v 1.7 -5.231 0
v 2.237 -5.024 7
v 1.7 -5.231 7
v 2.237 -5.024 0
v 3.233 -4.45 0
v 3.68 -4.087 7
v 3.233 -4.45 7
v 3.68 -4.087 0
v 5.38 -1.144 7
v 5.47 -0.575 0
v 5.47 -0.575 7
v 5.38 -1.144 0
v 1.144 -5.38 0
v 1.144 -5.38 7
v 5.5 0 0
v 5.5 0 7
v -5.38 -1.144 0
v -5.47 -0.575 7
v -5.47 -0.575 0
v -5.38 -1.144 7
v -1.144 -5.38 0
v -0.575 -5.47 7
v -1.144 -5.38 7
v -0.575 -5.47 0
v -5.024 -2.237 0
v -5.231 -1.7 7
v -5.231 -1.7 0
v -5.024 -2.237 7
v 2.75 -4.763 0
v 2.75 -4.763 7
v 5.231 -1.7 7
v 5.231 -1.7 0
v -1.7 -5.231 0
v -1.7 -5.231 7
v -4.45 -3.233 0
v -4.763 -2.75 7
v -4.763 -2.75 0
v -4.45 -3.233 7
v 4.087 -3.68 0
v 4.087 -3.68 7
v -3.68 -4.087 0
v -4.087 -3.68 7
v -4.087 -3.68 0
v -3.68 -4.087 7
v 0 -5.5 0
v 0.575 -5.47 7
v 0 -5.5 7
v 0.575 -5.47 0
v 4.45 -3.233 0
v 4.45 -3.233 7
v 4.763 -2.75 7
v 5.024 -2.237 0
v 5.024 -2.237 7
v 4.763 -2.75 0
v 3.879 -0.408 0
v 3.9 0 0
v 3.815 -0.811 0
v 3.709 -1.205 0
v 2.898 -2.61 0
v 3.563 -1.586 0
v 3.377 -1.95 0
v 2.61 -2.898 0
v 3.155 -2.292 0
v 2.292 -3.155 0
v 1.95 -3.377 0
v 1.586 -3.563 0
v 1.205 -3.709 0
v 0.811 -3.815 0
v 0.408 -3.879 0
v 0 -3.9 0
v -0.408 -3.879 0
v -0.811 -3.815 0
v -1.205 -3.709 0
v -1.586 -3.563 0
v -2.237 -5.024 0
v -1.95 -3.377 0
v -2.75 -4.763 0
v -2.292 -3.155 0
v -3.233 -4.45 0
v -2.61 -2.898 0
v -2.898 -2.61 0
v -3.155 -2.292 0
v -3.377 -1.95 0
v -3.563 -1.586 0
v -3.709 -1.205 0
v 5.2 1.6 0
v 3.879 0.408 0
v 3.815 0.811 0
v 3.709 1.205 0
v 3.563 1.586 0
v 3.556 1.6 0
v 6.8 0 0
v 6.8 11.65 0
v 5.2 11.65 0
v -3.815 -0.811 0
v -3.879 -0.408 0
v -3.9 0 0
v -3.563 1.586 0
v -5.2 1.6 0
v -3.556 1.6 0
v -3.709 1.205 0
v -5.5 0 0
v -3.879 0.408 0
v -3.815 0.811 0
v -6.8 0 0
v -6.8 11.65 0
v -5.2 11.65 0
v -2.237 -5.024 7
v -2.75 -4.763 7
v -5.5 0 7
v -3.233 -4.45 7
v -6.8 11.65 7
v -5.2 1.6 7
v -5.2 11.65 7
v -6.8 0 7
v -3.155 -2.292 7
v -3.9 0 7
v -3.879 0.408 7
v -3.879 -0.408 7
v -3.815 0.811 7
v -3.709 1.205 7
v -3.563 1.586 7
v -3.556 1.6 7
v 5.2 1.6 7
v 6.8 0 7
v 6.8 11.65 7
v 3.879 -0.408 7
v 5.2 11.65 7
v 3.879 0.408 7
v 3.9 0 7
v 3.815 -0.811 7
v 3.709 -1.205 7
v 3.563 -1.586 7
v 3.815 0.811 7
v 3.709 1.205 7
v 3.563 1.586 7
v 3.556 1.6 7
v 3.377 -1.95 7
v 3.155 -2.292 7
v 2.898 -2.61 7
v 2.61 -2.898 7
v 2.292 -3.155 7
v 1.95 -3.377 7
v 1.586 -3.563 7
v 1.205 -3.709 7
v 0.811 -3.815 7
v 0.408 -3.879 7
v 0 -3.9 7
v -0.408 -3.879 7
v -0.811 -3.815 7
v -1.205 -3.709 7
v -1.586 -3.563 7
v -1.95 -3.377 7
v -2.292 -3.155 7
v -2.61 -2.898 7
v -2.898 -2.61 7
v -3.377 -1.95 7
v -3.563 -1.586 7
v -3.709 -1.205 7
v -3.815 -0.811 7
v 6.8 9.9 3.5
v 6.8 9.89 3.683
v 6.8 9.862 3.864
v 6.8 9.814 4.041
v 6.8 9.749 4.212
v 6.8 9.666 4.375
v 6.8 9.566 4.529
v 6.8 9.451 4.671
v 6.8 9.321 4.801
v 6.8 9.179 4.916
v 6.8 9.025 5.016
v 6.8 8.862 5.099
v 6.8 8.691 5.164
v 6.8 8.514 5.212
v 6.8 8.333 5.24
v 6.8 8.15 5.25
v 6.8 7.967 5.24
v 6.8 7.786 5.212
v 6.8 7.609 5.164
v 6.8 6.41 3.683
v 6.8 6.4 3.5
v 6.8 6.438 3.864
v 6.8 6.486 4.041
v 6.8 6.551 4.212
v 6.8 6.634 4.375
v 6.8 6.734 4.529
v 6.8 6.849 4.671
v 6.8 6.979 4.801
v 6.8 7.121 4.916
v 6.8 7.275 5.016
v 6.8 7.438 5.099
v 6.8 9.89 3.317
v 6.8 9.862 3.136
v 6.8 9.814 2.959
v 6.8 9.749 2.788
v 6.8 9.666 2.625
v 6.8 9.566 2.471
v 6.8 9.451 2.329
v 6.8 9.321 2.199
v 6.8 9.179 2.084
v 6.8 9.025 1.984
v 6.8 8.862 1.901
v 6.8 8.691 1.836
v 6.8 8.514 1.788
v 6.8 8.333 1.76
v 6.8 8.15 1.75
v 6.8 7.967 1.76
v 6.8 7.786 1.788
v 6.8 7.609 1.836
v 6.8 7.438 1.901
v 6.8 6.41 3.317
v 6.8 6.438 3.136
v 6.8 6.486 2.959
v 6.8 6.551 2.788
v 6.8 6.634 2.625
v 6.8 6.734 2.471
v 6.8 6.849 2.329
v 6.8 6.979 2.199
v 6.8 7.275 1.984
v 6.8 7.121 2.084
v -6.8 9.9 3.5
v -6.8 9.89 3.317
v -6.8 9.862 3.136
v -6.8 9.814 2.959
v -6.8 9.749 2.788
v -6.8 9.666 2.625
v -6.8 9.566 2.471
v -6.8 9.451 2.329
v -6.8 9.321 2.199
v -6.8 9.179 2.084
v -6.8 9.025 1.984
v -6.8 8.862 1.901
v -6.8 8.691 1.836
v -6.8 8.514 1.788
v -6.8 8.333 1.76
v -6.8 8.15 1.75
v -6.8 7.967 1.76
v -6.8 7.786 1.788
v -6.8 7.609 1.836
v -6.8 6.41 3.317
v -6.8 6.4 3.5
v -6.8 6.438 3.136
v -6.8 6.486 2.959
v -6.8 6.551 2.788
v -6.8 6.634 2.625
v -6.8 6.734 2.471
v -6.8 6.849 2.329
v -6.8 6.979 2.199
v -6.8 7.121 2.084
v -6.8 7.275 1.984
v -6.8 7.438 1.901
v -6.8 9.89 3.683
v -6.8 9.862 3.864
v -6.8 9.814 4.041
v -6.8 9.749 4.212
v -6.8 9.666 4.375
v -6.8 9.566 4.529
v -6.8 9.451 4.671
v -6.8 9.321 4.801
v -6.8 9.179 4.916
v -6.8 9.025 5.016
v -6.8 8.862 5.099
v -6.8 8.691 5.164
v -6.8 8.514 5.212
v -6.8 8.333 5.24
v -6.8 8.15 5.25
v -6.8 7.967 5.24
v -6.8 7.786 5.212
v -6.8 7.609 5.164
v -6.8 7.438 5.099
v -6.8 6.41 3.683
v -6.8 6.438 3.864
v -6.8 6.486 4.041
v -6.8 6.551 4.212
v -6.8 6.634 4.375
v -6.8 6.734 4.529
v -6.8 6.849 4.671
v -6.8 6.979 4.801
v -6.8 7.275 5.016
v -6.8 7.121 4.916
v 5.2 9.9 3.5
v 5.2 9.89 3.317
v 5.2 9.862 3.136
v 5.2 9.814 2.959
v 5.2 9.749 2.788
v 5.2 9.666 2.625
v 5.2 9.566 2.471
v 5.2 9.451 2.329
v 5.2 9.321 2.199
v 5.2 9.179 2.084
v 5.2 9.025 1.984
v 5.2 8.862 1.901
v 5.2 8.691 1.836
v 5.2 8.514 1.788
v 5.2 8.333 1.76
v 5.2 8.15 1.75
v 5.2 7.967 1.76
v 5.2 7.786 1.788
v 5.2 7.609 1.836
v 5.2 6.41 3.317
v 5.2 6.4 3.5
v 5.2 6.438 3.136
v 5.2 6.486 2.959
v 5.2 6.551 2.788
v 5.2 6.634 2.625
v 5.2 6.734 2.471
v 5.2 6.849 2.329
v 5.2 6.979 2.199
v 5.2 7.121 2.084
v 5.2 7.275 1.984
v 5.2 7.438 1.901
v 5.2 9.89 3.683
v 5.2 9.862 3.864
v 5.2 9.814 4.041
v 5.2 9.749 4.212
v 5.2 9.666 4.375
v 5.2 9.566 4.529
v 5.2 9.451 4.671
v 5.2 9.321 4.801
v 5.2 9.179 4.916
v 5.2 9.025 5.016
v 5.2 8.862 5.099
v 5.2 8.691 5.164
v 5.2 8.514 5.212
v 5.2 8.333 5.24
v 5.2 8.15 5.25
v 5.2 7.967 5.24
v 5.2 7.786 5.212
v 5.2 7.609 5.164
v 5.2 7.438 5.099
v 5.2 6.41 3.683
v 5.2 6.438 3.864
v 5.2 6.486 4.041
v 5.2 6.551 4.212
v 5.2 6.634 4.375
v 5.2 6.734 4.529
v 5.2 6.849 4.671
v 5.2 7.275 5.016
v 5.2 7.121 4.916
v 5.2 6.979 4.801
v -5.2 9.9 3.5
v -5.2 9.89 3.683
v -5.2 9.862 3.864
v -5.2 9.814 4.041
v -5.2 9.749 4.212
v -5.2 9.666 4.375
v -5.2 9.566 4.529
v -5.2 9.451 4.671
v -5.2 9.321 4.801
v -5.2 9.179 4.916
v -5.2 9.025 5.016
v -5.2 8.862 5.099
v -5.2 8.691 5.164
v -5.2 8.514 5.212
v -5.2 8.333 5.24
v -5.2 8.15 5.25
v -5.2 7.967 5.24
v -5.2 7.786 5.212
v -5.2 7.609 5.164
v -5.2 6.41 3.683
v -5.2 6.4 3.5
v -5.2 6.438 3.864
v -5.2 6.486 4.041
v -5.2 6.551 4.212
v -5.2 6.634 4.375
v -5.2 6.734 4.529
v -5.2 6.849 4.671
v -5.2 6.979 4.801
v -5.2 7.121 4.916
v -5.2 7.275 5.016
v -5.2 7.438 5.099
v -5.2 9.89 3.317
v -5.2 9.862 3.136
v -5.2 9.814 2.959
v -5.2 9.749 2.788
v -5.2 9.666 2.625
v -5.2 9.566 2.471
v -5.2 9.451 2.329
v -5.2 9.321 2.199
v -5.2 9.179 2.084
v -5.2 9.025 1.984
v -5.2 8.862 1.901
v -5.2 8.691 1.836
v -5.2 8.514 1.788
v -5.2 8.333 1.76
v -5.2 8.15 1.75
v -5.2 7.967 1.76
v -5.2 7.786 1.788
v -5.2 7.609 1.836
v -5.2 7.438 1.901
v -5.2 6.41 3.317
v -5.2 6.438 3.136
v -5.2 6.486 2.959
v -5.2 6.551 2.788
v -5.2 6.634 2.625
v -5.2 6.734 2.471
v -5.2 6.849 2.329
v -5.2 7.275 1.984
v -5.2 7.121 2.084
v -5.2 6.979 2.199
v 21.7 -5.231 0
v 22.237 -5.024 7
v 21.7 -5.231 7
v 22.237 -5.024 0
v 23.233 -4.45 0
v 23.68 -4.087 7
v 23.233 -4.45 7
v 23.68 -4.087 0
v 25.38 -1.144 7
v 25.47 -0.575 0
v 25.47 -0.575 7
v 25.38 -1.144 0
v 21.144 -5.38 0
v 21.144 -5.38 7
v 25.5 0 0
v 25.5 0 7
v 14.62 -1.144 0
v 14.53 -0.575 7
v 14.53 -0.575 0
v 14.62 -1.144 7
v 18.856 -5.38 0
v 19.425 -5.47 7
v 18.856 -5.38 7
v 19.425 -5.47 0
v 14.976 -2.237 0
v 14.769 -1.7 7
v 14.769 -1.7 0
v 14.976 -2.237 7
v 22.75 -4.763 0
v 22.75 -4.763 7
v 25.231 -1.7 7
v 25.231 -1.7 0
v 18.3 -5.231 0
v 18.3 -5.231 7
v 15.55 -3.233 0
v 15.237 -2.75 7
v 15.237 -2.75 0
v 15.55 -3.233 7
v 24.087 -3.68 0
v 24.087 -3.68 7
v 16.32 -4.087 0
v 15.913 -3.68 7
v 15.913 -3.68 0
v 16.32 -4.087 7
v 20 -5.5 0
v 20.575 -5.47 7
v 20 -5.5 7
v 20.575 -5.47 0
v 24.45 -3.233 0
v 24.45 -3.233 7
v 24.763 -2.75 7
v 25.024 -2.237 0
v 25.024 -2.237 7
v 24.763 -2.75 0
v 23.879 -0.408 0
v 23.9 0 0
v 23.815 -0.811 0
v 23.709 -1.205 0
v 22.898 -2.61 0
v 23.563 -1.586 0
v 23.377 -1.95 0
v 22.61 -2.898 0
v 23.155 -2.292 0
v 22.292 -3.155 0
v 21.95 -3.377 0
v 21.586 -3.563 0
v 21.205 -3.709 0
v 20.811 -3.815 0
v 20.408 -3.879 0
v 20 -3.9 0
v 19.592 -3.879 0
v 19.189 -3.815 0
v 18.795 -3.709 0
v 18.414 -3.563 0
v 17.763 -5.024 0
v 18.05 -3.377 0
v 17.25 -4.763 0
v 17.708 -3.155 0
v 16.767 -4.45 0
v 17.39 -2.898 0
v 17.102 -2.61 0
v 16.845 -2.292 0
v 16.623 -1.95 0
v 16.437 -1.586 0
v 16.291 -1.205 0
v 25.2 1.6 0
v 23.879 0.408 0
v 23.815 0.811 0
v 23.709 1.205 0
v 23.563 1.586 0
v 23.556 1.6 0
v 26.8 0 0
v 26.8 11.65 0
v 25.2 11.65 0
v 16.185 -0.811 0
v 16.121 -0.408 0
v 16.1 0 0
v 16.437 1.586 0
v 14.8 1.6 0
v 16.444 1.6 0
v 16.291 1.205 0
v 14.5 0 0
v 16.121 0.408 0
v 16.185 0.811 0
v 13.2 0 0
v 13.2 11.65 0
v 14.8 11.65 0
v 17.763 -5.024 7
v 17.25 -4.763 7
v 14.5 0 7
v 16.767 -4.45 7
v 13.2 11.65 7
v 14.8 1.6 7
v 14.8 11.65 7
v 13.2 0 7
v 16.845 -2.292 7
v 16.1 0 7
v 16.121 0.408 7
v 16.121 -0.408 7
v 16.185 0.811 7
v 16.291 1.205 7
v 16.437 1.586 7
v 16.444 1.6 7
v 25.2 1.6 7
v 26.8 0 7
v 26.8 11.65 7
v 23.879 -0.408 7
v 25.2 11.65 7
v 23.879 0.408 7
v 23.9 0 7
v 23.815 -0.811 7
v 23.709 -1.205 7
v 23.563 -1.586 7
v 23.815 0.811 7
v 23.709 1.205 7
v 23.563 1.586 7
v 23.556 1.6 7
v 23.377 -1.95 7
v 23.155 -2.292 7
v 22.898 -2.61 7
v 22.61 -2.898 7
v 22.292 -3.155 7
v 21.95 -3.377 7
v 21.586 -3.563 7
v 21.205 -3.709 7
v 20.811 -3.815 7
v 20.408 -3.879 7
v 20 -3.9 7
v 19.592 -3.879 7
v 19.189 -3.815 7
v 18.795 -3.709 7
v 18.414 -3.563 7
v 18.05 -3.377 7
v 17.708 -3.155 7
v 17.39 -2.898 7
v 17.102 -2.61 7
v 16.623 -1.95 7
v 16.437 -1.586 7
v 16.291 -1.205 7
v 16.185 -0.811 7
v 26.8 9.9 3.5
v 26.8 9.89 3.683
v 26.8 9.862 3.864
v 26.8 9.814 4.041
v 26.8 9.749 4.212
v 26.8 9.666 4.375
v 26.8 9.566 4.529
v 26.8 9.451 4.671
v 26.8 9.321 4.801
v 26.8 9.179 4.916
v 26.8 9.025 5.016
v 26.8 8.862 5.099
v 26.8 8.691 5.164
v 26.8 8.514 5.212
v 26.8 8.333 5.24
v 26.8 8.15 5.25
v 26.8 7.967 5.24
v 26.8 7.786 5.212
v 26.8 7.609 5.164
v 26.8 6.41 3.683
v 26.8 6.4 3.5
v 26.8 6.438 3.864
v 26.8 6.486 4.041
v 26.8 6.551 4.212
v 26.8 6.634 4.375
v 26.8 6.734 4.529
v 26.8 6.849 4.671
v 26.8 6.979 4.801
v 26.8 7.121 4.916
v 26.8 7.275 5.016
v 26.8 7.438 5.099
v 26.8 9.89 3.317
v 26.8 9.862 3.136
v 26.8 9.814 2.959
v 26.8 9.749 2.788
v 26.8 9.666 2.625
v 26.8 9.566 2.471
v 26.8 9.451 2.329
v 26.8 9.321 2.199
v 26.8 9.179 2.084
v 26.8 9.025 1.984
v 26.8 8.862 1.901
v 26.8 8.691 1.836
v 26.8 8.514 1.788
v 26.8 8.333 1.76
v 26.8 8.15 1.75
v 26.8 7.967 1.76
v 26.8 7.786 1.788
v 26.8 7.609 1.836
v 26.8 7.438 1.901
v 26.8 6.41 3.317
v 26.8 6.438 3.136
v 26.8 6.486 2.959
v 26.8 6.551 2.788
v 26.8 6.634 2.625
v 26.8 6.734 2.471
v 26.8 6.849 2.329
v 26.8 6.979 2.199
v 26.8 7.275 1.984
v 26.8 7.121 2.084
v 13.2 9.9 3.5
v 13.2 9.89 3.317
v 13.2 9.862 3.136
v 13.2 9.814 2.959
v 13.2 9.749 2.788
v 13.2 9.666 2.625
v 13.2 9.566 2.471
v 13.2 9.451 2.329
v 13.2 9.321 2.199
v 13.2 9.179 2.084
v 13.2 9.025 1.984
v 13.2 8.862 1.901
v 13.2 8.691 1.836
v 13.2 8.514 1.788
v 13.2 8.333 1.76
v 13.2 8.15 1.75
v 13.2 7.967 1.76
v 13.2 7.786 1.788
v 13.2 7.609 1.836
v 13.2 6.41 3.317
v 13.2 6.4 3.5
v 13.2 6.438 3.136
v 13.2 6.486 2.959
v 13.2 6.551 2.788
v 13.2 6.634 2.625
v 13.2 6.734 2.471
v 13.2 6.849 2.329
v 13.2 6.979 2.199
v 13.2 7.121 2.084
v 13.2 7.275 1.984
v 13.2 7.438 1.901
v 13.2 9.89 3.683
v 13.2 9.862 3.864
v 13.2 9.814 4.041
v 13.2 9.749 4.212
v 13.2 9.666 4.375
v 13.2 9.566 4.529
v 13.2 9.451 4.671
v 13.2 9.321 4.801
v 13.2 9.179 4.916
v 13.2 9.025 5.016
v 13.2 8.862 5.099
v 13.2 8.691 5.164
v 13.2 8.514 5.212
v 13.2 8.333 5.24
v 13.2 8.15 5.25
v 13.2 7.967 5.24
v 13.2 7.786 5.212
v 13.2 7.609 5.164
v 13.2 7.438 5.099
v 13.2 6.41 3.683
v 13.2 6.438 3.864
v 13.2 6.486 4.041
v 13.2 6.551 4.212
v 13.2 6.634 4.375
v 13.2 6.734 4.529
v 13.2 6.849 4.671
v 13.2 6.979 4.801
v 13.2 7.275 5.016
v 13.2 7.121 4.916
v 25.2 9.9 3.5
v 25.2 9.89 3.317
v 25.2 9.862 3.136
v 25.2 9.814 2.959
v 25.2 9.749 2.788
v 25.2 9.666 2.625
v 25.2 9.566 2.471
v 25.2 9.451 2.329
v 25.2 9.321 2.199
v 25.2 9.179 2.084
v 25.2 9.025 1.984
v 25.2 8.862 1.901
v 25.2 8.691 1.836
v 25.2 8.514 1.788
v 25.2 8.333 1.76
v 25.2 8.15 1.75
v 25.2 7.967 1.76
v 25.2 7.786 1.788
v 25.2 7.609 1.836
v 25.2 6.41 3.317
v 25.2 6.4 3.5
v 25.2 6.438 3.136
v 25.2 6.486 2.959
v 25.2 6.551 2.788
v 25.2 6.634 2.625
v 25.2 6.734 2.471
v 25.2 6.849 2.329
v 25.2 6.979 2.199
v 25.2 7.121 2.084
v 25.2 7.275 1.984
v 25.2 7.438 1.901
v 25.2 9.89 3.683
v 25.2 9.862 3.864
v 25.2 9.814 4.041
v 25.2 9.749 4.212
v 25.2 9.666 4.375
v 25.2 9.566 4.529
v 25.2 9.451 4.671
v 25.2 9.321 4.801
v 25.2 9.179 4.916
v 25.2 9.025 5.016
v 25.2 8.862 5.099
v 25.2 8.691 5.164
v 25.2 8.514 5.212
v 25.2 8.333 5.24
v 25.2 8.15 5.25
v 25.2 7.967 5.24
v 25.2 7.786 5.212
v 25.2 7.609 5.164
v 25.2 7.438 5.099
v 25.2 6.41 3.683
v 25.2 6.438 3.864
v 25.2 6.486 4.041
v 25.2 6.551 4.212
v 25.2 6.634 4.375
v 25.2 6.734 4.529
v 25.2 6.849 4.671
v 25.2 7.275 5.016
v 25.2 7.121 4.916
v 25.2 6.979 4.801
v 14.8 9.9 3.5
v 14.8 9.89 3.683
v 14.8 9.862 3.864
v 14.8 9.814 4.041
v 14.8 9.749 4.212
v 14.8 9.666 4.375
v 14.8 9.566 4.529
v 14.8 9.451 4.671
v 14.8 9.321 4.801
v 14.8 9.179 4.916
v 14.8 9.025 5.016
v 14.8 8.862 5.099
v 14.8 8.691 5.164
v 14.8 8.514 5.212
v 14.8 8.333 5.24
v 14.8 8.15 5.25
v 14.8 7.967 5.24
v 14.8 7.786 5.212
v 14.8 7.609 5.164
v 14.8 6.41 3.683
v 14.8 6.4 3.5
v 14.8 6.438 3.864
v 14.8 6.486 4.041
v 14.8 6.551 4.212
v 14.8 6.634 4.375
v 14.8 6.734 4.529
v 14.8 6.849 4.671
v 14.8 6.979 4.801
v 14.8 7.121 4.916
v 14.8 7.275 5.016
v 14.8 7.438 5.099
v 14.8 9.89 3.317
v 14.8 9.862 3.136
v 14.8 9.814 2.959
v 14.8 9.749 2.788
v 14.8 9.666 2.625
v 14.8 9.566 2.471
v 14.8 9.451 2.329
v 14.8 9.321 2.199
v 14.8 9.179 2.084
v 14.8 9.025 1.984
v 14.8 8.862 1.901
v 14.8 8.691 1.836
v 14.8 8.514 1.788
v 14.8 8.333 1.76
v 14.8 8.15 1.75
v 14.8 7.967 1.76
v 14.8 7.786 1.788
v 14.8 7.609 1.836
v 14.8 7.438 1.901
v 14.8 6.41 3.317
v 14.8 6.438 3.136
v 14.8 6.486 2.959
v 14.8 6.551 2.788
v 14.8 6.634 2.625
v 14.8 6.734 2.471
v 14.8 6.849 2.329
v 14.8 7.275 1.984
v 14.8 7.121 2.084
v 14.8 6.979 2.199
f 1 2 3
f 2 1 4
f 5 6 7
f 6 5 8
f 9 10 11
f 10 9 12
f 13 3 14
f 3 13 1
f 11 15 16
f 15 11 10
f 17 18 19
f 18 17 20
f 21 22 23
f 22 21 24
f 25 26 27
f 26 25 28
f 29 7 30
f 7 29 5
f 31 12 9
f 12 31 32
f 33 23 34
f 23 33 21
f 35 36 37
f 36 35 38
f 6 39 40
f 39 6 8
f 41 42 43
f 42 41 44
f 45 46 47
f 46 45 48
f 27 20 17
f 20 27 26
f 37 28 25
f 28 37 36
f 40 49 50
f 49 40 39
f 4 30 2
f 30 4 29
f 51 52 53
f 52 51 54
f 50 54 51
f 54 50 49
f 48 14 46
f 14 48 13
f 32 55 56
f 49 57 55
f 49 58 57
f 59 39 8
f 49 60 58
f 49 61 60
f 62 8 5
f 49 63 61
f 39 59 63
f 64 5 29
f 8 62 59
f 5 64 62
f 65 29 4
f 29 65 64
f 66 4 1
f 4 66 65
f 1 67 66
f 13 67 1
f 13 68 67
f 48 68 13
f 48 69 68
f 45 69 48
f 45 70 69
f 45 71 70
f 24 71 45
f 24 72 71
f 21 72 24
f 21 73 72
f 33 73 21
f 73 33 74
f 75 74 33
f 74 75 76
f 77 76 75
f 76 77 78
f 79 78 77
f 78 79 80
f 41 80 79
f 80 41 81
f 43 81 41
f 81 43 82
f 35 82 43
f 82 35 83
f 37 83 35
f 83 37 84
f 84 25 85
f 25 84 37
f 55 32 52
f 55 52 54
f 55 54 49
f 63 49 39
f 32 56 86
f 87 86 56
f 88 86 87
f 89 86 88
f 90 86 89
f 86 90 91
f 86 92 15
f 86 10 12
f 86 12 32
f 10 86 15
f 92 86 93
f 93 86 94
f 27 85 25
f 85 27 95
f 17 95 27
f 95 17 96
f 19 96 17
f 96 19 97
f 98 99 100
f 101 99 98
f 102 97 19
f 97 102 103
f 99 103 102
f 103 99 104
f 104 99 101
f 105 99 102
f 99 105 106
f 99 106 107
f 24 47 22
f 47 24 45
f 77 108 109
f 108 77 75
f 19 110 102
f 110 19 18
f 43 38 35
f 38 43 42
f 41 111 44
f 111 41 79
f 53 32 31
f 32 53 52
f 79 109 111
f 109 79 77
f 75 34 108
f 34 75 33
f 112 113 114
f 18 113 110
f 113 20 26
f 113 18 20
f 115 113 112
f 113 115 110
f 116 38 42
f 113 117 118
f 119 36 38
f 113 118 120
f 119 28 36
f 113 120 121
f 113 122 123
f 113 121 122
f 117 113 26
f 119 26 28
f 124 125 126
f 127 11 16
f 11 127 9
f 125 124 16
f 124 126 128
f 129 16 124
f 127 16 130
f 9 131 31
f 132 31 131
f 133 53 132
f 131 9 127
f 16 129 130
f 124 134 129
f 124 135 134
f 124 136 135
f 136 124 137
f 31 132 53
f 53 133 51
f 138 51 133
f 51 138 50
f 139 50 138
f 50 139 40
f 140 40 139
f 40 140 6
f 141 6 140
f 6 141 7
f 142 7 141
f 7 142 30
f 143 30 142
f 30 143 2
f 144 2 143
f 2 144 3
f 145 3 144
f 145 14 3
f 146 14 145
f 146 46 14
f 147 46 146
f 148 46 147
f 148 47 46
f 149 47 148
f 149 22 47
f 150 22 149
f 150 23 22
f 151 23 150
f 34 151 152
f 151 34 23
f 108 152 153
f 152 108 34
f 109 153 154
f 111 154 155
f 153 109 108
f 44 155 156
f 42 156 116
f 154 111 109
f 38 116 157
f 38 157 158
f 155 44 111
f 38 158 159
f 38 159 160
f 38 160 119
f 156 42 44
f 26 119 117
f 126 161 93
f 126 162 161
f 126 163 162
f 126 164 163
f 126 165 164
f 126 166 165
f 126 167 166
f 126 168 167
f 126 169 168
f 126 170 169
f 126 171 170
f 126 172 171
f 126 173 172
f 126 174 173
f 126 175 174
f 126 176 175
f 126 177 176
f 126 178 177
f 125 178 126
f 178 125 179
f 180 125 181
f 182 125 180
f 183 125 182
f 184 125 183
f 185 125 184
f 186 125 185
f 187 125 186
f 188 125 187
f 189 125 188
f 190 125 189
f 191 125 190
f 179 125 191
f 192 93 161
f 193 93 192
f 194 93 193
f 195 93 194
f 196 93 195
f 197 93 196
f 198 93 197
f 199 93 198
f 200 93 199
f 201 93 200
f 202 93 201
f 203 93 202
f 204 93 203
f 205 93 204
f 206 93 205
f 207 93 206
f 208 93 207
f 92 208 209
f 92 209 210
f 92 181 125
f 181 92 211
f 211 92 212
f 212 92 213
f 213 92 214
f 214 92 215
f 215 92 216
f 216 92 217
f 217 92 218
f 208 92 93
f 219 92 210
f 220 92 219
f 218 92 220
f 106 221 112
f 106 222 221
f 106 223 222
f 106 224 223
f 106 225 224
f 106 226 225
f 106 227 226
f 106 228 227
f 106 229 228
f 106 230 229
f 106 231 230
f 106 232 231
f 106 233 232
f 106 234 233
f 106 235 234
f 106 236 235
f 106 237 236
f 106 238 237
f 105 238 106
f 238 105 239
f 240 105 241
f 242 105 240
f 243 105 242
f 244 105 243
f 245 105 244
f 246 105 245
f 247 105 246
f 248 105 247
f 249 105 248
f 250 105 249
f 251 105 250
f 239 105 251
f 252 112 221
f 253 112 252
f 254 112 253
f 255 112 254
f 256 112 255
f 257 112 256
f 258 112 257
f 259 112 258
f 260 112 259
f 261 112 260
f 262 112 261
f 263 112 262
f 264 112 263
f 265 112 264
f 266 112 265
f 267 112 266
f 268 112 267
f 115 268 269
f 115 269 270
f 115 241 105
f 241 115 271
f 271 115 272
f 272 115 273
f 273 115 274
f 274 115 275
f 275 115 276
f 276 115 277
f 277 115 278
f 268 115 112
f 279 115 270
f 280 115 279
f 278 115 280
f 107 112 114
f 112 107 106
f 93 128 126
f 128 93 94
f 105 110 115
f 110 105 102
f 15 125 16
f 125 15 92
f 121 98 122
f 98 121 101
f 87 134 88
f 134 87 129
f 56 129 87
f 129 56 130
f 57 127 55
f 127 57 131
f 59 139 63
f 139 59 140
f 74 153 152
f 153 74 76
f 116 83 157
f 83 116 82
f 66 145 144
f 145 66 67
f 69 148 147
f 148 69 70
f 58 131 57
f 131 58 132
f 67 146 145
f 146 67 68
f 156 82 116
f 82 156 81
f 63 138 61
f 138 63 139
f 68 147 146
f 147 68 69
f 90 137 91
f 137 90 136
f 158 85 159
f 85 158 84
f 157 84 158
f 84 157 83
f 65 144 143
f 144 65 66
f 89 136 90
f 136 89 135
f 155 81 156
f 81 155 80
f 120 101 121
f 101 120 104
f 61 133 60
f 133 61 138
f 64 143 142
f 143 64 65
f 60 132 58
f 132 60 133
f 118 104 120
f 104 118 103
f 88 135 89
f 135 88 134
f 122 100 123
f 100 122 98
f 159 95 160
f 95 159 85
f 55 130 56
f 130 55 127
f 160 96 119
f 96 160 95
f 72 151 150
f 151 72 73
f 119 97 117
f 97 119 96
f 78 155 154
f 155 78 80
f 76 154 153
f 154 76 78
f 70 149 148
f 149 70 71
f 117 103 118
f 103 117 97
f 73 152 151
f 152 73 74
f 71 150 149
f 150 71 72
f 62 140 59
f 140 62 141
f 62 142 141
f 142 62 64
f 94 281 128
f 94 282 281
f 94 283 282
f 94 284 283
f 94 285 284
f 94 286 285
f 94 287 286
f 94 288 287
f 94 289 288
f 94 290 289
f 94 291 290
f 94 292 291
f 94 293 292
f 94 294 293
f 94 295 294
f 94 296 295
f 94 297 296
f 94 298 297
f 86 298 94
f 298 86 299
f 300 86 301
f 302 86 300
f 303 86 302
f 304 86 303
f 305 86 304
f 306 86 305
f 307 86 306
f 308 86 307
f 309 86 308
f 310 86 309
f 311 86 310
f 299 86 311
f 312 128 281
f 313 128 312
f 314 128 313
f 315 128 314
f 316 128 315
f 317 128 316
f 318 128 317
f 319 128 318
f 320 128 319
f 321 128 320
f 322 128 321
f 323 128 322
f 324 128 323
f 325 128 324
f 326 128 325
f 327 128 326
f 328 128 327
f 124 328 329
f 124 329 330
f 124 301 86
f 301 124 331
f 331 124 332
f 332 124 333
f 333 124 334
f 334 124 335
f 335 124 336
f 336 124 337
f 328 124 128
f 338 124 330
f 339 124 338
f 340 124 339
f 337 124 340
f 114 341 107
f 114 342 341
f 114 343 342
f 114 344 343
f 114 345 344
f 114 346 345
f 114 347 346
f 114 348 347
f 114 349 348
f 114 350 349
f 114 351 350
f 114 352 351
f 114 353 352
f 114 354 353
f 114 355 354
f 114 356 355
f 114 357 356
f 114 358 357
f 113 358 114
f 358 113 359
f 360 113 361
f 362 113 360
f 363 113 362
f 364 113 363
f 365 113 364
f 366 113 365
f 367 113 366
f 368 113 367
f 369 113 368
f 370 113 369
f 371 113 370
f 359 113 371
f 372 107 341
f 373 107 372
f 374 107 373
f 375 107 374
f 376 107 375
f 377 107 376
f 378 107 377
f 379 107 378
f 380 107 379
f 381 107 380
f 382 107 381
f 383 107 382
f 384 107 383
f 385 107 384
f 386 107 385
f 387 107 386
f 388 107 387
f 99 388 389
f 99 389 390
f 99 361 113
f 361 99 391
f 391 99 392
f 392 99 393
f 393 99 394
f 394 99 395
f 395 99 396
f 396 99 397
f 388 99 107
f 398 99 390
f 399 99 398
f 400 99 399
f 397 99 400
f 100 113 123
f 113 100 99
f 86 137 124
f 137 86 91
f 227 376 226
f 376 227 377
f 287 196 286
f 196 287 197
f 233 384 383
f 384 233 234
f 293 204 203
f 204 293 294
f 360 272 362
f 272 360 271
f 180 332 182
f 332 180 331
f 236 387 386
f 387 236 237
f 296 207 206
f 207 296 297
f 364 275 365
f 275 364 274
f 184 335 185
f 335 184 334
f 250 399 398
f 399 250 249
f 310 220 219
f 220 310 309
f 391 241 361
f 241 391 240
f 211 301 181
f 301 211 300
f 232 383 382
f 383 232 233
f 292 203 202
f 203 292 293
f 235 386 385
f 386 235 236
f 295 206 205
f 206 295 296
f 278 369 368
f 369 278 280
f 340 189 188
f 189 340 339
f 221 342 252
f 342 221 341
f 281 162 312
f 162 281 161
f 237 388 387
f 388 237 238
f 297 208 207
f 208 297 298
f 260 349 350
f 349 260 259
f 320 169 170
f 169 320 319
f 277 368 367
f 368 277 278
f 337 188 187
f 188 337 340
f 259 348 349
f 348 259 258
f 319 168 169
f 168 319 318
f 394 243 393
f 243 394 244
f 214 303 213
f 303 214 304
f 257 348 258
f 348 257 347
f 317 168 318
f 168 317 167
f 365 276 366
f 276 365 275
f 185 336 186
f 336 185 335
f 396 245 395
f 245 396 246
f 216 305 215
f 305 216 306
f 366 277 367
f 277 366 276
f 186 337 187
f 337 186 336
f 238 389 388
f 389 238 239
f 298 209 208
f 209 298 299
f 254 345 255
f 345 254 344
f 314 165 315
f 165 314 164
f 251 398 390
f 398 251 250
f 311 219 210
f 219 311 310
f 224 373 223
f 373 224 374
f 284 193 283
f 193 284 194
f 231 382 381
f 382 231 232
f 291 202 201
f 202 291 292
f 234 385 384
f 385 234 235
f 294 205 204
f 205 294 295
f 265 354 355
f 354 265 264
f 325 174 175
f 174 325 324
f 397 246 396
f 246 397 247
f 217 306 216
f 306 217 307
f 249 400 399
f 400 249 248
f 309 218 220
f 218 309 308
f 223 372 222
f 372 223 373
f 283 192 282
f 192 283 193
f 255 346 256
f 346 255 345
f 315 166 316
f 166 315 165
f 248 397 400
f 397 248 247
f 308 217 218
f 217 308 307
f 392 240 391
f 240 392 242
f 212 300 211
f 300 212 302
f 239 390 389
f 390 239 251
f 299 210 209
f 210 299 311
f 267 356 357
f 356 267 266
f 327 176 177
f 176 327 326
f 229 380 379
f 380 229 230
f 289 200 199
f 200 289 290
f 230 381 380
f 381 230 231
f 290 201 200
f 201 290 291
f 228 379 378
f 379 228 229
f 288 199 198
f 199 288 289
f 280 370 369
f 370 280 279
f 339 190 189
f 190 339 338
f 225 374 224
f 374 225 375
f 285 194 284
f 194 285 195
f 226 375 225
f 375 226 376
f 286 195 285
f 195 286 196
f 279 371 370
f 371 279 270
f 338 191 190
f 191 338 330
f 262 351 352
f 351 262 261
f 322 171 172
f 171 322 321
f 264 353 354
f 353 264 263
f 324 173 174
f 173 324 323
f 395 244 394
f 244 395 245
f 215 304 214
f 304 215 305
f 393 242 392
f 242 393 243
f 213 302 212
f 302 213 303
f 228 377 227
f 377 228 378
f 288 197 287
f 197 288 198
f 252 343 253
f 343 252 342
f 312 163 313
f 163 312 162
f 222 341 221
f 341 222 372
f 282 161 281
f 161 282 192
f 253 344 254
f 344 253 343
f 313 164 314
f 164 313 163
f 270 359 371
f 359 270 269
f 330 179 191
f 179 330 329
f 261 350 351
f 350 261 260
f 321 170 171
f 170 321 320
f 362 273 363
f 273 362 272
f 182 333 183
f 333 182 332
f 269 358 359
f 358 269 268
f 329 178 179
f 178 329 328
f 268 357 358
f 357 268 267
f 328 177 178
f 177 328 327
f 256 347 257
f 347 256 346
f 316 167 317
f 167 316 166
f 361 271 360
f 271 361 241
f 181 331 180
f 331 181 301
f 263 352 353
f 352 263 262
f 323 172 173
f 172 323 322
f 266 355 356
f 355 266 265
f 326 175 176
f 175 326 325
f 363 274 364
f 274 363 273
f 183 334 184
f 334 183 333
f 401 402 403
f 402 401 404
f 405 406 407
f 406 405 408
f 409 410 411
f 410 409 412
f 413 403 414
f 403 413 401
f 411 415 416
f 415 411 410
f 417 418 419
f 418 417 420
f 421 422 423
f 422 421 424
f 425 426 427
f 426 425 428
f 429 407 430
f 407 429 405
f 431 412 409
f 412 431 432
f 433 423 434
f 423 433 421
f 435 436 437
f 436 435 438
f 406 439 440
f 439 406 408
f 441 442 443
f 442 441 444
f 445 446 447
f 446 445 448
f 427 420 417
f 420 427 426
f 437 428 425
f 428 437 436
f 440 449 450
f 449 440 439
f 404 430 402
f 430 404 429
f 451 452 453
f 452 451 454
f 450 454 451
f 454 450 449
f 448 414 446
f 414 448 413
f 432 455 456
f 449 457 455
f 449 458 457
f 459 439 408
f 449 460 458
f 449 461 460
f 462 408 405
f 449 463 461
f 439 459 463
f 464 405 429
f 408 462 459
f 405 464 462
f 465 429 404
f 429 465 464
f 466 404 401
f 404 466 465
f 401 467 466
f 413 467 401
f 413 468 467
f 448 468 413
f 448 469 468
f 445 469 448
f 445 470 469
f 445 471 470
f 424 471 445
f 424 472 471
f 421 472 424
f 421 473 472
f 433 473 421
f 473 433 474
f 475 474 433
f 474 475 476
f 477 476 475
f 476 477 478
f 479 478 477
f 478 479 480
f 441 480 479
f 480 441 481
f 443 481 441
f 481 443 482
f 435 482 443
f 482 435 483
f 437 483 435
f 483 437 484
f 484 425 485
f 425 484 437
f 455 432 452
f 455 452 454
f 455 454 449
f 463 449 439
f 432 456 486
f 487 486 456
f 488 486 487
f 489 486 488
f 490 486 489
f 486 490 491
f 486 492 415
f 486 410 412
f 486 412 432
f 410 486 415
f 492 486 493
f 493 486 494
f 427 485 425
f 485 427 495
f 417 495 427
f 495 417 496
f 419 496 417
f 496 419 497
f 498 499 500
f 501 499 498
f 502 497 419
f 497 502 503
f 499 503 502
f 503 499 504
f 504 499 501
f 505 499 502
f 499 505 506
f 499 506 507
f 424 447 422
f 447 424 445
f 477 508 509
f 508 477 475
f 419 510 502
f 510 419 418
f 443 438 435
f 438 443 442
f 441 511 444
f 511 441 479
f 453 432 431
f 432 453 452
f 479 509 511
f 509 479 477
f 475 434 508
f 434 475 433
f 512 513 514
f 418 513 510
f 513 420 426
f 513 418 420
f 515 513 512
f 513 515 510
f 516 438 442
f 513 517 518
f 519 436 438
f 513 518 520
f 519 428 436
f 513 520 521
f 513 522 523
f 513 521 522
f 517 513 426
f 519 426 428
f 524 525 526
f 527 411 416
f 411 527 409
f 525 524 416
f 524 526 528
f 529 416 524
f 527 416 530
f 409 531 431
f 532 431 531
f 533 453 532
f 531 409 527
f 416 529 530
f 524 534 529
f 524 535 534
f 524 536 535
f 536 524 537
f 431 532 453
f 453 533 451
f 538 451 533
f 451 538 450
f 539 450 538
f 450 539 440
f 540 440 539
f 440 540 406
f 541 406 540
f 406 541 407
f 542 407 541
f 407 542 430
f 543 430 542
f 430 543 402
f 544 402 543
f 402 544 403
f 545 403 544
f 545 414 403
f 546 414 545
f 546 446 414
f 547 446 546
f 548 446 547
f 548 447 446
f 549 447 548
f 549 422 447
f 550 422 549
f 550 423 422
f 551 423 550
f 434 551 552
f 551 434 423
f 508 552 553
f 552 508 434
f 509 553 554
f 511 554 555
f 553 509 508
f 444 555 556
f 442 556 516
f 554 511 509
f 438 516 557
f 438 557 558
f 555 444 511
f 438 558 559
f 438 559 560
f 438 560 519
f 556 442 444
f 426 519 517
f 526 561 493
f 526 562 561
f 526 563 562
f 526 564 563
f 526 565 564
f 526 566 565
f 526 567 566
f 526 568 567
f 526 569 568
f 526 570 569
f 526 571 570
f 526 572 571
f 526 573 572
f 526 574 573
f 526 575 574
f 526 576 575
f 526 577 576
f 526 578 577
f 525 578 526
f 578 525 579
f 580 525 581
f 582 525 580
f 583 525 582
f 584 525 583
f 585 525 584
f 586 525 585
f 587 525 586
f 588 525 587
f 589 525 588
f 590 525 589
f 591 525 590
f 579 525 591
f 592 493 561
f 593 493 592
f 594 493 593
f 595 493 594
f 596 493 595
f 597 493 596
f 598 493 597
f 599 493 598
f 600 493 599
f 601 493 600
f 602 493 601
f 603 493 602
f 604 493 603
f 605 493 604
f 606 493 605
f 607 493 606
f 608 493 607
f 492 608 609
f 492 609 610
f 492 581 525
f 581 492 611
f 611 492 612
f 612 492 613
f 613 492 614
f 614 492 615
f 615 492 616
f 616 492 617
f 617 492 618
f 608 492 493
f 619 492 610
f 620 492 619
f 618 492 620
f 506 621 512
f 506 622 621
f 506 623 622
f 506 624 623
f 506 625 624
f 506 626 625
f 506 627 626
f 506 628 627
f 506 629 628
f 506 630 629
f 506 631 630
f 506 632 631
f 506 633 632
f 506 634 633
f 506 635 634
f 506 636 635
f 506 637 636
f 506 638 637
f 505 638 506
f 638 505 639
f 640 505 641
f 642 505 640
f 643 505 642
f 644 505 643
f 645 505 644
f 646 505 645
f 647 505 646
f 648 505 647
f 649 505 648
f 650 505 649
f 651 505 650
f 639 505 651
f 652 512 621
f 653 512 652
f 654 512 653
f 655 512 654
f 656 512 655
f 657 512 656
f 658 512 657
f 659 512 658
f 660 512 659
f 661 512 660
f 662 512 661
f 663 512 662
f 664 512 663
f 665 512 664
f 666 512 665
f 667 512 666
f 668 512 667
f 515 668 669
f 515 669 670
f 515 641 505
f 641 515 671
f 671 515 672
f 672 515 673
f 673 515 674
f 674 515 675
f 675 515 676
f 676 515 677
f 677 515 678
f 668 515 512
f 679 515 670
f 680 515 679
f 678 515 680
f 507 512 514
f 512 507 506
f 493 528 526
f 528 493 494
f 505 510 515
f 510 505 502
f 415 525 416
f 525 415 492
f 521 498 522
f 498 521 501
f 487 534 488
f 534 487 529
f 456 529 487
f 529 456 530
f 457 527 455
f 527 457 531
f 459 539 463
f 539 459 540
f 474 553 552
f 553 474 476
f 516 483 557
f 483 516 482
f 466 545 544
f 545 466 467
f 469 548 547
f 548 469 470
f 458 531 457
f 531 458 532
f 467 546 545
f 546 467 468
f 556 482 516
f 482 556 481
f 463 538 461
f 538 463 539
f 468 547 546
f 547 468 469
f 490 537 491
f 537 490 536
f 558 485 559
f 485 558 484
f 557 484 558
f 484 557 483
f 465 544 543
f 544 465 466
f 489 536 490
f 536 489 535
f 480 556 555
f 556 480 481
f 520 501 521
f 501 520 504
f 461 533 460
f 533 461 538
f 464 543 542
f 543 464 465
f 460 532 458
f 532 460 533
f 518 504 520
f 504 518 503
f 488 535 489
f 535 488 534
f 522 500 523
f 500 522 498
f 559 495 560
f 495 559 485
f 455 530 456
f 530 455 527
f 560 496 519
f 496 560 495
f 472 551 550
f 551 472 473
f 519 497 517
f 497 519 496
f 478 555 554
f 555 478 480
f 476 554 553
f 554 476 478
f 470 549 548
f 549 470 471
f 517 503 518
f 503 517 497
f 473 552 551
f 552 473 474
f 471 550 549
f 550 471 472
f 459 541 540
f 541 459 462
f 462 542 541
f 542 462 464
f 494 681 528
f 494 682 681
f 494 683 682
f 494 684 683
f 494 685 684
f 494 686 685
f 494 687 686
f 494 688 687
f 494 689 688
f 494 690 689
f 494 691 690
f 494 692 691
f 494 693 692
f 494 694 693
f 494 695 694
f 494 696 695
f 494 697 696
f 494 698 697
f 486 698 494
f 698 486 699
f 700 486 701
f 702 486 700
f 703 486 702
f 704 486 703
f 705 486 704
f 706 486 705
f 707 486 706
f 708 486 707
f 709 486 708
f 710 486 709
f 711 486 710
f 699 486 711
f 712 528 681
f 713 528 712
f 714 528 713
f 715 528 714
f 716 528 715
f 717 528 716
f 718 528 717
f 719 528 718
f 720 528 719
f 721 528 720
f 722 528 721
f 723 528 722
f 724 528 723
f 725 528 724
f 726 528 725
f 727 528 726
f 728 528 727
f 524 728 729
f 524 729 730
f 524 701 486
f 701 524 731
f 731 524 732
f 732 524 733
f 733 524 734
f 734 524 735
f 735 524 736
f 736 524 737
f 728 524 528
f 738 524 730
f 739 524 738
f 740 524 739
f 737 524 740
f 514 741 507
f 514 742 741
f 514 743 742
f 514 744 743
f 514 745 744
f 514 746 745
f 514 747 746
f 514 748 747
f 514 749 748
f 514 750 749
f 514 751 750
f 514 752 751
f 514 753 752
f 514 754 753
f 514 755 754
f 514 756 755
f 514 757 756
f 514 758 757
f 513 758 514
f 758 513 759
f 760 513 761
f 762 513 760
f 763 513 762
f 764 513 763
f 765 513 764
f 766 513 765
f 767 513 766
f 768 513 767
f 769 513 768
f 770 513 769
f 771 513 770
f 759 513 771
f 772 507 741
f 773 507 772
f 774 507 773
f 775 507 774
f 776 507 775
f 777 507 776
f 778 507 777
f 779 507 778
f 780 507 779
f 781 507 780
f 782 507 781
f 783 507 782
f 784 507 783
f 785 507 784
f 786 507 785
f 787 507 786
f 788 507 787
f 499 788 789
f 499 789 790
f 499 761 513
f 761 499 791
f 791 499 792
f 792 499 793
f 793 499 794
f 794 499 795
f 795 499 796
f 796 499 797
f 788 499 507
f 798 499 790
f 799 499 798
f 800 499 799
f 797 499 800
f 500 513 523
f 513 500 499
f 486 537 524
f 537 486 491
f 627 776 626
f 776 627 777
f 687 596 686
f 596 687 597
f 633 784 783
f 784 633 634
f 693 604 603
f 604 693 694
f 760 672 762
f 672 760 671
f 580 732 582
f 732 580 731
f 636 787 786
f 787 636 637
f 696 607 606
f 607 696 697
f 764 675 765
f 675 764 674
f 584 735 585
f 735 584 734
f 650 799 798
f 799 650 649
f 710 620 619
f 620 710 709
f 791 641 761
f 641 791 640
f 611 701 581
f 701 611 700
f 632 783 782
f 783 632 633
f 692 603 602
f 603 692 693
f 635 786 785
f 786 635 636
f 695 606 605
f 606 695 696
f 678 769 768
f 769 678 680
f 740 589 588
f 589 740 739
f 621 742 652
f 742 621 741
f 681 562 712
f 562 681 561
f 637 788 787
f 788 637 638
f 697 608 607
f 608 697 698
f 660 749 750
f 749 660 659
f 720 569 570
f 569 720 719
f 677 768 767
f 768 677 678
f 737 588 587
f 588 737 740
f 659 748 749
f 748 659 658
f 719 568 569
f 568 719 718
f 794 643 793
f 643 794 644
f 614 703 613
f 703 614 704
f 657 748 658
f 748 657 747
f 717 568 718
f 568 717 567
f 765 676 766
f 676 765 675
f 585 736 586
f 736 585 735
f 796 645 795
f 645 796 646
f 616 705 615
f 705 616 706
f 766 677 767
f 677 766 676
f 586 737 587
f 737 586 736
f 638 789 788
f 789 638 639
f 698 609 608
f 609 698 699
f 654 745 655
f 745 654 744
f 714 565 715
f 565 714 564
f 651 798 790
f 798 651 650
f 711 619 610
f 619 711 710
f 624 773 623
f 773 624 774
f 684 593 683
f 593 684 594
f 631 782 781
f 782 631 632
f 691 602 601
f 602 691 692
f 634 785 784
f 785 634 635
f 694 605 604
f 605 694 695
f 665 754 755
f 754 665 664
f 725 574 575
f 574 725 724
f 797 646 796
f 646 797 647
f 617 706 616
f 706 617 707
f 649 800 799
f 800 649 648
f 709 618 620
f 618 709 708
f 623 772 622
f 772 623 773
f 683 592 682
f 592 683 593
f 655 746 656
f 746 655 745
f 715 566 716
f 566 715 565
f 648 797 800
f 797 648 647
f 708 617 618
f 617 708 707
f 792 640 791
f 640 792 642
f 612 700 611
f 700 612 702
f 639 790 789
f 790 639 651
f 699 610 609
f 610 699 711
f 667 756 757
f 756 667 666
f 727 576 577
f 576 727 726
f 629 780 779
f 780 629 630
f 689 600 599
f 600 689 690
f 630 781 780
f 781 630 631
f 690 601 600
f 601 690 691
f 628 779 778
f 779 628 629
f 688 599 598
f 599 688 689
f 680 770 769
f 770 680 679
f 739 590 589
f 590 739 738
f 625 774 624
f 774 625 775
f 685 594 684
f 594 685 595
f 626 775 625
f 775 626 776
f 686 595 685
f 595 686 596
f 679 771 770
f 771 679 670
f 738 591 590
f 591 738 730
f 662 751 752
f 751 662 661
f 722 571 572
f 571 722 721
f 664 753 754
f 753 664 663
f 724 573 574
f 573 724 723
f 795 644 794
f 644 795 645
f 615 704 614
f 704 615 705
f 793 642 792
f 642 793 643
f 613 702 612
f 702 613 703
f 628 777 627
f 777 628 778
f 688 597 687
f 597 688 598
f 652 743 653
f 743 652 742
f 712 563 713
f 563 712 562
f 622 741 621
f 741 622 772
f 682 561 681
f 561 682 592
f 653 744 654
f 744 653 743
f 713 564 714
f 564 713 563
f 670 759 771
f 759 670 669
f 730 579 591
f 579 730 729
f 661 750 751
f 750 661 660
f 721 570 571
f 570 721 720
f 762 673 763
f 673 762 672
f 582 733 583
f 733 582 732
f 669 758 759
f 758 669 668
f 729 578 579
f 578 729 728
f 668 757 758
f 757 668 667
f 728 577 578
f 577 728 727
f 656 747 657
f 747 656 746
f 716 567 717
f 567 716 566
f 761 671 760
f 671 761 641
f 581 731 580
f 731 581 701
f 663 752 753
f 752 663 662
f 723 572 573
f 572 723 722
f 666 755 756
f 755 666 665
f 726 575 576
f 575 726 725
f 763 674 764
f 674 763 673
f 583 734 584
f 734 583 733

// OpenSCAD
/*
 * TVRRUG Fan mount
 *
 * Copyright 2012 <b@Zi.iS>
 * License CC BY 3.0
 */

$fn = 60;
m8 = 7.80 / 2;
m3 = 3.5 / 2;

fan();
translate(	[
	20,
	0,
	0
]) {
	fan();
}

module fan(
	rod = m8,
	bolt = m3,
	thickness = 1.6,
	inset = 2.5,
	width = 10.4
) {
	shell = rod +thickness;
	length = bolt * 4;
	difference() {
		union() {
			cylinder(
				r=shell,
				h=length
			);
			translate(	[
				-(width+thickness*2)/2,
				0,
				0
			]) {
				cube([
					width+thickness*2,
					bolt*3+inset+rod,
					length
				]);
			}
		}
		translate(	[
			0,
			0,
			-1
		]) {
			cylinder(
				r=rod,
				h=length+2
			);
		}
		translate(	[
			-(width)/2,
			thickness,
			-1
		]) {
			cube([
				width,
				bolt*3+inset+thickness*2+rod*2+1,
				length+2
			]);
		}
		translate(	[
			-1-width/2-thickness,
			rod+bolt+inset,
			length/2
		]) {
			rotate([
				0,
				90,
				0
			]) {
				cylinder(
					r=bolt,
					h=width+thickness*2+2
				);
			}
		}

	}

}
